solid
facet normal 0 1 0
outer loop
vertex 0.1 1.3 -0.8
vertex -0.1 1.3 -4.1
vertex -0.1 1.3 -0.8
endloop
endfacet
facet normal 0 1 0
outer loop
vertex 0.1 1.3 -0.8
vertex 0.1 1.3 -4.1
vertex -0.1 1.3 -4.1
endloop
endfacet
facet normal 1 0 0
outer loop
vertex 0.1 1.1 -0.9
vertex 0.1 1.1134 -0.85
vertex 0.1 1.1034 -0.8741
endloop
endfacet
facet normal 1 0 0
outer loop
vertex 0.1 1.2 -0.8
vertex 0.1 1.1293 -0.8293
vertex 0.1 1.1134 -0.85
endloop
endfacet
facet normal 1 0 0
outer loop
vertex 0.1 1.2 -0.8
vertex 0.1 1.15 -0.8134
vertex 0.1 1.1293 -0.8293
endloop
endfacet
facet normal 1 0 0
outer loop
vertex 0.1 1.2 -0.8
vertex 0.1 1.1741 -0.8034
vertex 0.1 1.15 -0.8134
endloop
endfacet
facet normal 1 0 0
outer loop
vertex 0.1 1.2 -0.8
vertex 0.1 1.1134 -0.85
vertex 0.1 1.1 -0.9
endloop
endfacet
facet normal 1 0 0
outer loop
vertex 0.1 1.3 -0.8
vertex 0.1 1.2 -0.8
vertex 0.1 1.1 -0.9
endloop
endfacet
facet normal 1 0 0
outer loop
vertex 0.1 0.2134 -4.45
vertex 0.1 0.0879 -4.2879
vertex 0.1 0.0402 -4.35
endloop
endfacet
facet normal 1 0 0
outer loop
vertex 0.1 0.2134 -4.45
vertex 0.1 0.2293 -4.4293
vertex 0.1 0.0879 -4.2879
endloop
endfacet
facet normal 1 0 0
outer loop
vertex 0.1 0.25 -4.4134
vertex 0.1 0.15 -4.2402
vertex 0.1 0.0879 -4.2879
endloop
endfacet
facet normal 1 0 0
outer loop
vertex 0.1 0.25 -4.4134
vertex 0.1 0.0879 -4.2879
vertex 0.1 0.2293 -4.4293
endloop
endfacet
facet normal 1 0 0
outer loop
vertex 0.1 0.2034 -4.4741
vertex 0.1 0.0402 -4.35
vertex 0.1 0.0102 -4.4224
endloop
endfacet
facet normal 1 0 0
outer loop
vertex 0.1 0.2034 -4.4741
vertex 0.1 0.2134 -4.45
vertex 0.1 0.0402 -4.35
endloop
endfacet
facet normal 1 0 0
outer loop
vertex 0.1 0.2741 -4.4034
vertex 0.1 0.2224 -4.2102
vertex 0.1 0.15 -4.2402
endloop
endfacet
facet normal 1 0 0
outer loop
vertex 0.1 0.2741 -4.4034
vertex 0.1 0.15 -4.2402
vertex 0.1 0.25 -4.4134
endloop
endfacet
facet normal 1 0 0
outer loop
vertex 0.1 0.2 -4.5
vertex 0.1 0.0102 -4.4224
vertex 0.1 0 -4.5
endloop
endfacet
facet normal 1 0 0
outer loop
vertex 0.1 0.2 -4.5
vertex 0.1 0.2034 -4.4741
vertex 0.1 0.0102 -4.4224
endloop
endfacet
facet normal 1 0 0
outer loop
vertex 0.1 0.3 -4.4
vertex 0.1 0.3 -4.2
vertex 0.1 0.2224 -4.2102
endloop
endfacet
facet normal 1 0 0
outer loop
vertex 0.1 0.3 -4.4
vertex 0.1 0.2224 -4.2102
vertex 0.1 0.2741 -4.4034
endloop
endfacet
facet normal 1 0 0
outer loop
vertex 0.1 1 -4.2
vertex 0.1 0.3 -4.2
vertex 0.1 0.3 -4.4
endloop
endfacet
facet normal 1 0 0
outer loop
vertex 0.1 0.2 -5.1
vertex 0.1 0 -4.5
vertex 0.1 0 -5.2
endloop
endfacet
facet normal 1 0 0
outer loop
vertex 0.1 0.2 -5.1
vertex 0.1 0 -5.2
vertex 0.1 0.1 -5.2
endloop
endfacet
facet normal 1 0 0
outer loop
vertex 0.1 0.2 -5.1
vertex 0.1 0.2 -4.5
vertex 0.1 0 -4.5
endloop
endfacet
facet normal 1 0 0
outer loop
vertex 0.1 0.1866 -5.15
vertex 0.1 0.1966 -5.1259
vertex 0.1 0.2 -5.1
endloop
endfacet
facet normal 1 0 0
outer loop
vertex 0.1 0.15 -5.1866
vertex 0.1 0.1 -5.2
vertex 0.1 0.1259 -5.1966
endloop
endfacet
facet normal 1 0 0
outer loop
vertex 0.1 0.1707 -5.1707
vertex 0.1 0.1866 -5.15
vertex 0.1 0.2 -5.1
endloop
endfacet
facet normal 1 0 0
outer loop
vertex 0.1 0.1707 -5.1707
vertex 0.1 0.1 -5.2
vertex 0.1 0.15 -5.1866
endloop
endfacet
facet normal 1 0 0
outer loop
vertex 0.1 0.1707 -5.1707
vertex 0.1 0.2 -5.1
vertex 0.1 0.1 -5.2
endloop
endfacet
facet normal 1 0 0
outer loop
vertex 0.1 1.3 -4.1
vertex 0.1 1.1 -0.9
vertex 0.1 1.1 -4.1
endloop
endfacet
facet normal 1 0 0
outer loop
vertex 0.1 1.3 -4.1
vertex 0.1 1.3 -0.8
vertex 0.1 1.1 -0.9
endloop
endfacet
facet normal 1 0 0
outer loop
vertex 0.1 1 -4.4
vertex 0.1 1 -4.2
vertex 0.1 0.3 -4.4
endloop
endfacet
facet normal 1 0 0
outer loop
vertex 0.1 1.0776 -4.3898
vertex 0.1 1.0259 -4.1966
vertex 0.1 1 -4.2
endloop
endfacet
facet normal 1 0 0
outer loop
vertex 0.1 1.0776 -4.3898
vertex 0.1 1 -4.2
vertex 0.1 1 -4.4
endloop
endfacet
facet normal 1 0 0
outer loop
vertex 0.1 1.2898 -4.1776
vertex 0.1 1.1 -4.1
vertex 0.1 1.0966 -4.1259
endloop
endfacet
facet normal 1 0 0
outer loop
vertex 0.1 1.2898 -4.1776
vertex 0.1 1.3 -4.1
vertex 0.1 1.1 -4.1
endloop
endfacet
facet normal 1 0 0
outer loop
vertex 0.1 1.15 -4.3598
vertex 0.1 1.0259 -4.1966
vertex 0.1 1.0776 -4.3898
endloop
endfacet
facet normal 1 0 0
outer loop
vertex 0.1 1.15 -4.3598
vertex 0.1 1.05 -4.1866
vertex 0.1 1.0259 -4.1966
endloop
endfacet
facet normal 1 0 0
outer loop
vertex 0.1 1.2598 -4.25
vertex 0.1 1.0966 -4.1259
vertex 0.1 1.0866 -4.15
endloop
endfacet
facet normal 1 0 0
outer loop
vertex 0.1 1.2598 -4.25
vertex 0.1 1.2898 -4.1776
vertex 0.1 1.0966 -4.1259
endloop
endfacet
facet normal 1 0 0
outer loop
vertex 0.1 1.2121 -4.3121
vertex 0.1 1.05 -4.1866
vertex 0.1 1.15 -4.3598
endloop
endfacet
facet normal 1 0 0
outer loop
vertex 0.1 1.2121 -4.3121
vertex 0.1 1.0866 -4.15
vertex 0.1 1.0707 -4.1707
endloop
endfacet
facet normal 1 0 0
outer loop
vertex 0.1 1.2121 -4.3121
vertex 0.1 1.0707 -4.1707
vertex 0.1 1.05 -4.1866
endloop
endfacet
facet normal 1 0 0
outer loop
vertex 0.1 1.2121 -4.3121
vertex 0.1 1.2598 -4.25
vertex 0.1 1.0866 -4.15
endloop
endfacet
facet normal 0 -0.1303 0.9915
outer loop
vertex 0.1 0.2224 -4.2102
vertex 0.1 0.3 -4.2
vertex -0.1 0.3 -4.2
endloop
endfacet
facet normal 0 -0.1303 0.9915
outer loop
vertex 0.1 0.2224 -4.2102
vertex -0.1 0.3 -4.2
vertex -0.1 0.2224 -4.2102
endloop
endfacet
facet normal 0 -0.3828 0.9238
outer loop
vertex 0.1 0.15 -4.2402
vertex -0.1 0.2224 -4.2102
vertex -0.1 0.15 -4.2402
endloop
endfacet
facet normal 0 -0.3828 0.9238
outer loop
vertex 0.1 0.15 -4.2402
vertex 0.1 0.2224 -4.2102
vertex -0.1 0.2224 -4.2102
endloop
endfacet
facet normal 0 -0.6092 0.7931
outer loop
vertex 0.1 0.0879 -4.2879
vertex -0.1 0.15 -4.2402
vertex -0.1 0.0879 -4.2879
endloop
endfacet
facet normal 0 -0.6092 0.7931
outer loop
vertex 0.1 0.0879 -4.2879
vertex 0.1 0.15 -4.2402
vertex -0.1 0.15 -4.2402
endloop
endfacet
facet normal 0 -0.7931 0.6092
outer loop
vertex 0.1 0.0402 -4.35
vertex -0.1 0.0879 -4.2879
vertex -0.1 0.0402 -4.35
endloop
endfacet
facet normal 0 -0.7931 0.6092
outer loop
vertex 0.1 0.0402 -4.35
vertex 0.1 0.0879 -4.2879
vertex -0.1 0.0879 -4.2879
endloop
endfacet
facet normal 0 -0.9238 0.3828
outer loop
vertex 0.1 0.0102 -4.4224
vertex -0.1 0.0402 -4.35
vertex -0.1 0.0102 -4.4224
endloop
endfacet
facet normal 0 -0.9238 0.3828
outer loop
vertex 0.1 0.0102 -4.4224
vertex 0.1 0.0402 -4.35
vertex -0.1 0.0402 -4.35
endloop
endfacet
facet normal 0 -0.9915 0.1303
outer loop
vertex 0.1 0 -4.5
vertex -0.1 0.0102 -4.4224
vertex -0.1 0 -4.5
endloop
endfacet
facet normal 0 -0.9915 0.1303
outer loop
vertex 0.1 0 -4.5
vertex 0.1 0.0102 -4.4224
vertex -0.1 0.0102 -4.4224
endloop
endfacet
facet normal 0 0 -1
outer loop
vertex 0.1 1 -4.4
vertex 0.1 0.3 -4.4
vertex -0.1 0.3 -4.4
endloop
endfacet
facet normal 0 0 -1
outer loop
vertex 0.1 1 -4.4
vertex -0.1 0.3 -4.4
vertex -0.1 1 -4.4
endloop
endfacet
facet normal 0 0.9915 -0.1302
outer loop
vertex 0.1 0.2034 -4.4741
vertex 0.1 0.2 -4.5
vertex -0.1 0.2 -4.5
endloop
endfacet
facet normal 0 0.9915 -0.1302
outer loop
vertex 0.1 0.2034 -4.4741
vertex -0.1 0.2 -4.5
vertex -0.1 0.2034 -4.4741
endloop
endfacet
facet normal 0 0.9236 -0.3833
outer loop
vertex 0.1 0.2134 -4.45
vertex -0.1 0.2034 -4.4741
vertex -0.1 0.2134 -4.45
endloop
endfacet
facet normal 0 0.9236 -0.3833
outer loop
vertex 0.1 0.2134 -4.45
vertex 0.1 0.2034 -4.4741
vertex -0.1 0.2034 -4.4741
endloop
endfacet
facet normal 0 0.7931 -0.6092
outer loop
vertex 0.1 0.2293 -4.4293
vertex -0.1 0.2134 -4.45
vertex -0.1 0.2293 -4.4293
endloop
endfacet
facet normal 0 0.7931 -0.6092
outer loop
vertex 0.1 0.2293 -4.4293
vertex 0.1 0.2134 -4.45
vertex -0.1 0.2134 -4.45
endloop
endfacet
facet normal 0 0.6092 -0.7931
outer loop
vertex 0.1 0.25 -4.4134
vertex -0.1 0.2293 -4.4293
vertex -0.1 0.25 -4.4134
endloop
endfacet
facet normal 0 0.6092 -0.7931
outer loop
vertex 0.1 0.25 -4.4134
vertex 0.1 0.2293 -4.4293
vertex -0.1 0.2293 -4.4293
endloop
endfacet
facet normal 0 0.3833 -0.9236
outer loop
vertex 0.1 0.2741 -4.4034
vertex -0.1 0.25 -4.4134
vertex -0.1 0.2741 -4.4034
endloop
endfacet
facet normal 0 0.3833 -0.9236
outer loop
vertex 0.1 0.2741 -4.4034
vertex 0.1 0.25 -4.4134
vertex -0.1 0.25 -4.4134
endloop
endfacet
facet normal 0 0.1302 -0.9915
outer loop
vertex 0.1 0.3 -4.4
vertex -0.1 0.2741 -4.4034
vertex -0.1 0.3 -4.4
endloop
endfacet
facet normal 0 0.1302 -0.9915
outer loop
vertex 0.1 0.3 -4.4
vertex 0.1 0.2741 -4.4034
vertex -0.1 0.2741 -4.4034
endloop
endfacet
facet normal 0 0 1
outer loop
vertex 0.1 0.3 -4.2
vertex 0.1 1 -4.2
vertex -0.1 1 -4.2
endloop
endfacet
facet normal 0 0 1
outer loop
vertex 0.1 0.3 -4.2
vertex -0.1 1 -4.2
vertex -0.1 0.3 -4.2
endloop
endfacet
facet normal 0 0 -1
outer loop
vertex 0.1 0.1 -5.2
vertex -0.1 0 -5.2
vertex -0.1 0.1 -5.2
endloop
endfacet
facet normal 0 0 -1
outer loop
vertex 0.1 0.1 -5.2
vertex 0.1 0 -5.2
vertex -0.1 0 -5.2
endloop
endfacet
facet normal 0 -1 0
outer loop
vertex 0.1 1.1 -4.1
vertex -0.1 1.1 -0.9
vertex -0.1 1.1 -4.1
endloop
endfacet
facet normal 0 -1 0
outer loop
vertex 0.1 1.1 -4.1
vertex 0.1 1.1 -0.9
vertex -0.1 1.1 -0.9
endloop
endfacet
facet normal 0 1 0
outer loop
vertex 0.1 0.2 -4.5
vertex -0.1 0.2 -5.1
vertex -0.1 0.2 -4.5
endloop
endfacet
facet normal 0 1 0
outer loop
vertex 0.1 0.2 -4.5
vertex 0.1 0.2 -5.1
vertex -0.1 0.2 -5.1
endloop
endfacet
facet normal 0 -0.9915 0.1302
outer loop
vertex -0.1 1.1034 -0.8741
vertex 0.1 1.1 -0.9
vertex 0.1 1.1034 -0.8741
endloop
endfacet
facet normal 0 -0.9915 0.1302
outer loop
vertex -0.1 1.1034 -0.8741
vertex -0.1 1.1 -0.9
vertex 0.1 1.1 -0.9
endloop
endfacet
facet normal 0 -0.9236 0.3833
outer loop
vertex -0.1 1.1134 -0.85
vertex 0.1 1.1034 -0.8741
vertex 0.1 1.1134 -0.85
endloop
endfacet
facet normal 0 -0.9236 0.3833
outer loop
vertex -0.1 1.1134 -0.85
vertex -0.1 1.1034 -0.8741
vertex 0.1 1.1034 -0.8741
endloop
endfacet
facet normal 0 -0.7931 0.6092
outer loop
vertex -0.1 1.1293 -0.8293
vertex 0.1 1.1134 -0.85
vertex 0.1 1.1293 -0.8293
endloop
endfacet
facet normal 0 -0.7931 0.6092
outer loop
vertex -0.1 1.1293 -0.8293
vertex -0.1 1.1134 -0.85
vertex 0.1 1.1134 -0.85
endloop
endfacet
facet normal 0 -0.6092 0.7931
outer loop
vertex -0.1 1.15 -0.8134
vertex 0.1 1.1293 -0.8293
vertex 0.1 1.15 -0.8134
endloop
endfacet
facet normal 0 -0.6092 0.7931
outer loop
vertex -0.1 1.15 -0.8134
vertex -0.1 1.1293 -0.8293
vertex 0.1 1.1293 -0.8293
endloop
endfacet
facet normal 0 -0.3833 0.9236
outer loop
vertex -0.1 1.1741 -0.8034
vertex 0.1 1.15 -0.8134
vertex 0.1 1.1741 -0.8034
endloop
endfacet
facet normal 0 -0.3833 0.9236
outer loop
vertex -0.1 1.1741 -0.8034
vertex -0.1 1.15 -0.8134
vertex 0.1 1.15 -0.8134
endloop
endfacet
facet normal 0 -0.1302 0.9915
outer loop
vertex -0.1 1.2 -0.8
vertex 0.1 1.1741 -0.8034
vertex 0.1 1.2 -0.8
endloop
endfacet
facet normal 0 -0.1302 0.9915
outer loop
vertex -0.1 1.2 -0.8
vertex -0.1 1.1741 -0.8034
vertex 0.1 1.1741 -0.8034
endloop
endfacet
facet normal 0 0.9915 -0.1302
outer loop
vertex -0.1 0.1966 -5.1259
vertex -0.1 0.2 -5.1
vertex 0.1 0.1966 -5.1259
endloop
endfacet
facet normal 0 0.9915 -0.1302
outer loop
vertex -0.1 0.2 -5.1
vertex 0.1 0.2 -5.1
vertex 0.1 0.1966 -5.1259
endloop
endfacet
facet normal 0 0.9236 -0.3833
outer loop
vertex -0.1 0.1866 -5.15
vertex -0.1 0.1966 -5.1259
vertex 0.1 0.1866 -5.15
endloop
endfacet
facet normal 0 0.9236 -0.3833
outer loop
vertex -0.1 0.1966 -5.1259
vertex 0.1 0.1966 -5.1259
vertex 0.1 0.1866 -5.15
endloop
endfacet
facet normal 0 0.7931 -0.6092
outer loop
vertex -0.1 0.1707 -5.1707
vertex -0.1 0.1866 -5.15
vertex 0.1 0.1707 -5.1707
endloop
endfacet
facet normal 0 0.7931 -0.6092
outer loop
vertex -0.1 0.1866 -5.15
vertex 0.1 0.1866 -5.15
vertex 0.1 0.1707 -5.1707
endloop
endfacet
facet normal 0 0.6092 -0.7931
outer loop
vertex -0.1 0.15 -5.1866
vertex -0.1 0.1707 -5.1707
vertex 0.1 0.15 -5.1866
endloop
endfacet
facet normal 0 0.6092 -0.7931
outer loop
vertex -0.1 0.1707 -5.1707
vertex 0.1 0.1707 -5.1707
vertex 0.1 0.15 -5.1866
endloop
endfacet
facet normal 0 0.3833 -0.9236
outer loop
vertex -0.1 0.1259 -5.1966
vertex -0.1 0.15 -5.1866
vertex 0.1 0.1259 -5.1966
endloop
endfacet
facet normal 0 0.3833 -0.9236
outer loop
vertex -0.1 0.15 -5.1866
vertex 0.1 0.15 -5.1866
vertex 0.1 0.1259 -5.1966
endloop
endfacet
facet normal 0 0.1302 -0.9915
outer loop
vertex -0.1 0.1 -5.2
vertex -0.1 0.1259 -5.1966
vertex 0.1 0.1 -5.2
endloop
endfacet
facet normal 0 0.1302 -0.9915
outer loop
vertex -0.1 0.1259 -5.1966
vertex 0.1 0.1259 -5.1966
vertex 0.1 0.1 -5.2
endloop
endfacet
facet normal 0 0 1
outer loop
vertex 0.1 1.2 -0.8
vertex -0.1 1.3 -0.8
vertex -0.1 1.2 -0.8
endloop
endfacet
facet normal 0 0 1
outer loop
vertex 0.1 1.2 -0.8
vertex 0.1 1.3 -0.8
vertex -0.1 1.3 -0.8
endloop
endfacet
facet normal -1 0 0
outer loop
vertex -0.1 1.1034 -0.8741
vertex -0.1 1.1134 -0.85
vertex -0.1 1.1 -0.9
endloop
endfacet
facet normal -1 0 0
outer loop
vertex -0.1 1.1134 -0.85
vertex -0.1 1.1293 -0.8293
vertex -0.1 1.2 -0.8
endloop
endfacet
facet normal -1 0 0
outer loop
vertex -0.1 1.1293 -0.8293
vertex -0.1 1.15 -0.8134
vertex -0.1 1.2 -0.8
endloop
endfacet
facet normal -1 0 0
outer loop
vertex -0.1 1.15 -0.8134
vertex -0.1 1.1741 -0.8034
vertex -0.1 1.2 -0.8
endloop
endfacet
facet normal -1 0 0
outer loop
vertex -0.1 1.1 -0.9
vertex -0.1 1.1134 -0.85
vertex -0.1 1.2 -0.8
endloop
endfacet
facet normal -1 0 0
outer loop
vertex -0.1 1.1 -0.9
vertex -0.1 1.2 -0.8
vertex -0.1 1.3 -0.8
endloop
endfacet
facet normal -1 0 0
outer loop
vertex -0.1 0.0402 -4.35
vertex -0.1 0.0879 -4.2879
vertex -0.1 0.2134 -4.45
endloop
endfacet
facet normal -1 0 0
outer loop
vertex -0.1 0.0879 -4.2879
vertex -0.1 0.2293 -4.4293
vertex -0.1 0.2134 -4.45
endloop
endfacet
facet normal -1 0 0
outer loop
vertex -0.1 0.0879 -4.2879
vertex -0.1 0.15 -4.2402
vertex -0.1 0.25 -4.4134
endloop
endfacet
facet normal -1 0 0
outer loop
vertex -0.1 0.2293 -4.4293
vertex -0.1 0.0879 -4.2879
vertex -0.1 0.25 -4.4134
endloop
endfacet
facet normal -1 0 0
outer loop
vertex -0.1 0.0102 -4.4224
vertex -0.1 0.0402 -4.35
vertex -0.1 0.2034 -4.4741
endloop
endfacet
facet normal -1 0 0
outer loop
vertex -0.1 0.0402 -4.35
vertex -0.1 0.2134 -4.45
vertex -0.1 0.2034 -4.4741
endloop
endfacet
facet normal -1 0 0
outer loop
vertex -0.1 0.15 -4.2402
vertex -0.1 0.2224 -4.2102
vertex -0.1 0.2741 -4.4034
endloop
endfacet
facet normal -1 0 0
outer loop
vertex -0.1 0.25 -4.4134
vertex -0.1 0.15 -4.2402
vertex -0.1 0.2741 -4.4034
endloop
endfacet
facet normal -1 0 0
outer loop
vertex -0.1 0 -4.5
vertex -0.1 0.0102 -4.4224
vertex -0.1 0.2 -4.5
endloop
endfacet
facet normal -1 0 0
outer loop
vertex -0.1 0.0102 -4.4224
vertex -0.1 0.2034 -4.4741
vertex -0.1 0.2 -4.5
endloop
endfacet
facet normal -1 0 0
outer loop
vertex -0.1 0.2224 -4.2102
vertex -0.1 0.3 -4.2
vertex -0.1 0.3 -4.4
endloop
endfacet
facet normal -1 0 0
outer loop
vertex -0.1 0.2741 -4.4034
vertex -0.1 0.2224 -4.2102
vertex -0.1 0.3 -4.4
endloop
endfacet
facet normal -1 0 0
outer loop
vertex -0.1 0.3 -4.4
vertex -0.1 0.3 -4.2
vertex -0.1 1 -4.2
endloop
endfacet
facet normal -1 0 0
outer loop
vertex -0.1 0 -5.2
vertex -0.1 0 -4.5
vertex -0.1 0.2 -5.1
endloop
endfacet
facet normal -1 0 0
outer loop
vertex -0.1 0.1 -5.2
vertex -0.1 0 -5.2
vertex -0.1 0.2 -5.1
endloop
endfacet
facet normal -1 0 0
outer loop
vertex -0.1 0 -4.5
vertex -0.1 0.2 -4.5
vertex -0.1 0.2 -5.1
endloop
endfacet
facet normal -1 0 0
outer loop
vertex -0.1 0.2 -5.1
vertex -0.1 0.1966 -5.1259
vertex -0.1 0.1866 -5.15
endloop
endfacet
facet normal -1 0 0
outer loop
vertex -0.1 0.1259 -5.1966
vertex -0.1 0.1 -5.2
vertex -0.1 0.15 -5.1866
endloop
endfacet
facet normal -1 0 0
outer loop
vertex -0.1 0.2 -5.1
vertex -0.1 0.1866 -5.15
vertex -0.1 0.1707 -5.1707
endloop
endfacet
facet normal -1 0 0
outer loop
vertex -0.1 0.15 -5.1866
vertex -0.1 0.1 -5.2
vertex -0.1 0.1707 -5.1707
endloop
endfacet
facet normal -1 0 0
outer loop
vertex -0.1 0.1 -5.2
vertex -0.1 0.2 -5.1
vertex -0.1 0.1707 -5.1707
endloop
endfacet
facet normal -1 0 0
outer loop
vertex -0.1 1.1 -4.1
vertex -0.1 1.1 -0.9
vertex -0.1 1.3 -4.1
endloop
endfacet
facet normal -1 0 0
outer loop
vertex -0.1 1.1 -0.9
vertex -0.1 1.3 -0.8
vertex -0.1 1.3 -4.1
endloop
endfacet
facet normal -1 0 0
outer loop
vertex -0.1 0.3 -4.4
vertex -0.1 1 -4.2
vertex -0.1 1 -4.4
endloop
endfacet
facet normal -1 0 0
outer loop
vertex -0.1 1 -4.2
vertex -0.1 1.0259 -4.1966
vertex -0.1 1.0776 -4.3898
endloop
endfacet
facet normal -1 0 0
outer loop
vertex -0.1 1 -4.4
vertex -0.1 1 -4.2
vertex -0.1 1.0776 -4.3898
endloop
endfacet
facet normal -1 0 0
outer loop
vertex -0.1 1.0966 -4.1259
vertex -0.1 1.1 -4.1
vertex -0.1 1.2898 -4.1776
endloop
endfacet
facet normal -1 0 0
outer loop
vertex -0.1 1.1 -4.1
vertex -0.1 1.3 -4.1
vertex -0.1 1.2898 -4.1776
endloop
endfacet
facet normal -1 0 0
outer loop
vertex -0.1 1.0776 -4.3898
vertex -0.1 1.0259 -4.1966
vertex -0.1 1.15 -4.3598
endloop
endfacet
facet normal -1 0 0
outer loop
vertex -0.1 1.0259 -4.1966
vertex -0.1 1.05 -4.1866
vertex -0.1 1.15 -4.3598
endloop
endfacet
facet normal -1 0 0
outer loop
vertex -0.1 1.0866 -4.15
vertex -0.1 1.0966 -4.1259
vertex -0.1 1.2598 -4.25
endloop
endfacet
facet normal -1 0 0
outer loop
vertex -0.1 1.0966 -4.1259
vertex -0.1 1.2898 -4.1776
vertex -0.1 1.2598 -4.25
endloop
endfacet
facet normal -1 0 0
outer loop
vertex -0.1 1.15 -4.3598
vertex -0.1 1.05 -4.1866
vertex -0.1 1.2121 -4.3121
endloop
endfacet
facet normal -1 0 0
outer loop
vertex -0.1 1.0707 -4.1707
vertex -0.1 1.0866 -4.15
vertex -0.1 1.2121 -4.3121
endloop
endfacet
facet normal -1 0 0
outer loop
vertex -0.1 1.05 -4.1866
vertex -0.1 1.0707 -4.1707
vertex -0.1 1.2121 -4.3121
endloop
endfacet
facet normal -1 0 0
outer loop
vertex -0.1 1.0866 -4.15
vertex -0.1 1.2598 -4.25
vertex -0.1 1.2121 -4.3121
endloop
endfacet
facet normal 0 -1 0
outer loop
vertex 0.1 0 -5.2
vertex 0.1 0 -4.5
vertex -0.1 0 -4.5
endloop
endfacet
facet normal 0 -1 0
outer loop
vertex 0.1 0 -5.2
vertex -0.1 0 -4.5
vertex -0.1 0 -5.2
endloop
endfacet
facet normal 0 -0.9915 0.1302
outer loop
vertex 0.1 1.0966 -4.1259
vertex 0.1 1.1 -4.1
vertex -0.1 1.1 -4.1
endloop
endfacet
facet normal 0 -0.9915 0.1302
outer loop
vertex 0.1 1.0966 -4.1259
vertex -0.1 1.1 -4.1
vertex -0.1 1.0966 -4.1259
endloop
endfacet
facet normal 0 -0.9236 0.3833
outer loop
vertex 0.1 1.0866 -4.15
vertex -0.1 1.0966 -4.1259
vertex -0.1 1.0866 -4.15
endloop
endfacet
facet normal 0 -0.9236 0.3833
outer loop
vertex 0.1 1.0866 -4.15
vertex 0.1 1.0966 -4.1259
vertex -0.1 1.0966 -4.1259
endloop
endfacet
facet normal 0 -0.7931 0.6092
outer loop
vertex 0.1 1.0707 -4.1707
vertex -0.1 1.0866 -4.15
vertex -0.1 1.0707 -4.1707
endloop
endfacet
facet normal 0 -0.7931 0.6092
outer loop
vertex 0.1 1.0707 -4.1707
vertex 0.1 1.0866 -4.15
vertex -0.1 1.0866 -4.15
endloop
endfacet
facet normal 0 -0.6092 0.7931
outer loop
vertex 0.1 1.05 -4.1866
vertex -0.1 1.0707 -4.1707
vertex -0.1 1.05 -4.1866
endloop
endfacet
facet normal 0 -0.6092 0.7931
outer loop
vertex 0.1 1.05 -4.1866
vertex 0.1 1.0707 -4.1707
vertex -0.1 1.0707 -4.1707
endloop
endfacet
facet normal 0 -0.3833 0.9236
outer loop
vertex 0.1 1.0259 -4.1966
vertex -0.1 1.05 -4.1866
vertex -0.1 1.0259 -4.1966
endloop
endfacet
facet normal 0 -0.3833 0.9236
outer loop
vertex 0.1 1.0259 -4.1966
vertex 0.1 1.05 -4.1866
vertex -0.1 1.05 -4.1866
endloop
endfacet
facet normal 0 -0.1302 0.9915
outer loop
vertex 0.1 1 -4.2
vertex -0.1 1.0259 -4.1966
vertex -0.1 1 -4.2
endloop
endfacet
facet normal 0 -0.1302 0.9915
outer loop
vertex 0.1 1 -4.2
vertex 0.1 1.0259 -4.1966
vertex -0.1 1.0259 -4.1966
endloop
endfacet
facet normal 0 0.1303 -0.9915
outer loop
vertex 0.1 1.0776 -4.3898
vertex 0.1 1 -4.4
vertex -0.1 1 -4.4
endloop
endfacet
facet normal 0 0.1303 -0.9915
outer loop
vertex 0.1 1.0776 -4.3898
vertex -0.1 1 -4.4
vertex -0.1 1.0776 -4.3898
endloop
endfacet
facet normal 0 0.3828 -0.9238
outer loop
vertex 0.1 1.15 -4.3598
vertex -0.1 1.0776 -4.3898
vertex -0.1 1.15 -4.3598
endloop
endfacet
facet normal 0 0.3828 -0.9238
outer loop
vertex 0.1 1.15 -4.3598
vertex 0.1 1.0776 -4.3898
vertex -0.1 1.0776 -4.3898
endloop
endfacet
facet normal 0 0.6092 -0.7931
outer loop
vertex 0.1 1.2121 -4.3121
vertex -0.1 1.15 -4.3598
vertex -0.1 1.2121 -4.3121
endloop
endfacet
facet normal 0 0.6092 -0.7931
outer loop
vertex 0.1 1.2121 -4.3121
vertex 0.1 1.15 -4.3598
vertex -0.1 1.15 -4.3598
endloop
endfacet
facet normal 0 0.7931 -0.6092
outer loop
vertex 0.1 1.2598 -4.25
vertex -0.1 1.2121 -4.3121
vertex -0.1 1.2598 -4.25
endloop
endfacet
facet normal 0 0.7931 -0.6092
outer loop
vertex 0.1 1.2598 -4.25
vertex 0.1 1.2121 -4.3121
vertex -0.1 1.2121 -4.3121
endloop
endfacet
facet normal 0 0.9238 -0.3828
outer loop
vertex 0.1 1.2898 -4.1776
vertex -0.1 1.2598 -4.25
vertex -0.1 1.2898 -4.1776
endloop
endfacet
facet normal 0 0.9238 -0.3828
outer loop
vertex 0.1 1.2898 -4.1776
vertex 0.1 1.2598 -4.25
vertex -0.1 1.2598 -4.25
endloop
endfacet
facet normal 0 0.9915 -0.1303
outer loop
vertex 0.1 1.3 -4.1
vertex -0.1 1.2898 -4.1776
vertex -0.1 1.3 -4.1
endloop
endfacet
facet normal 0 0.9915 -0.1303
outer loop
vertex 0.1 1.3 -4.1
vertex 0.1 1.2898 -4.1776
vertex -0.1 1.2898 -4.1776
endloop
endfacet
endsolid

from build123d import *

# Parameters (mm, degrees)
EXTRUDE_THIN1_DEPTH = 0.1
FILLET1_R           = 0.1


with BuildPart() as part:
    # Sketch1 → Extrude-Thin1 (new body, symmetric)
    with BuildSketch(Plane(origin=(0, 0, 0), x_dir=(0, 0, -1), z_dir=(1, 0, 0))):
        with BuildLine():
            Line((0.8, 1.1), (4.1, 1.1))
            ThreePointArc((4.1, 1.1), (4.170710678, 1.070710678), (4.2, 1))
            Line((4.2, 1), (4.2, 0.3))
            ThreePointArc((4.2, 0.3), (4.287867966, 0.087867966), (4.5, 0))
            Line((4.5, 0), (5.2, 0))
            Line((5.2, 0), (5.2, 0.2))
            Line((5.2, 0.2), (4.5, 0.2))
            ThreePointArc((4.5, 0.2), (4.429289322, 0.229289322), (4.4, 0.3))
            Line((4.4, 0.3), (4.4, 1))
            ThreePointArc((4.4, 1), (4.312132034, 1.212132034), (4.1, 1.3))
            Line((4.1, 1.3), (0.8, 1.3))
            Line((0.8, 1.3), (0.8, 1.1))
        make_face()
    extrude(amount=EXTRUDE_THIN1_DEPTH, both=True)

    # Fillet1
    fillet1_edges = [part.edges().sort_by_distance(p)[0] for p in [
        (0, 1.1, -0.8),
        (0, 0.2, -5.2),
    ]]
    fillet(fillet1_edges, radius=FILLET1_R)


solid = part.part
